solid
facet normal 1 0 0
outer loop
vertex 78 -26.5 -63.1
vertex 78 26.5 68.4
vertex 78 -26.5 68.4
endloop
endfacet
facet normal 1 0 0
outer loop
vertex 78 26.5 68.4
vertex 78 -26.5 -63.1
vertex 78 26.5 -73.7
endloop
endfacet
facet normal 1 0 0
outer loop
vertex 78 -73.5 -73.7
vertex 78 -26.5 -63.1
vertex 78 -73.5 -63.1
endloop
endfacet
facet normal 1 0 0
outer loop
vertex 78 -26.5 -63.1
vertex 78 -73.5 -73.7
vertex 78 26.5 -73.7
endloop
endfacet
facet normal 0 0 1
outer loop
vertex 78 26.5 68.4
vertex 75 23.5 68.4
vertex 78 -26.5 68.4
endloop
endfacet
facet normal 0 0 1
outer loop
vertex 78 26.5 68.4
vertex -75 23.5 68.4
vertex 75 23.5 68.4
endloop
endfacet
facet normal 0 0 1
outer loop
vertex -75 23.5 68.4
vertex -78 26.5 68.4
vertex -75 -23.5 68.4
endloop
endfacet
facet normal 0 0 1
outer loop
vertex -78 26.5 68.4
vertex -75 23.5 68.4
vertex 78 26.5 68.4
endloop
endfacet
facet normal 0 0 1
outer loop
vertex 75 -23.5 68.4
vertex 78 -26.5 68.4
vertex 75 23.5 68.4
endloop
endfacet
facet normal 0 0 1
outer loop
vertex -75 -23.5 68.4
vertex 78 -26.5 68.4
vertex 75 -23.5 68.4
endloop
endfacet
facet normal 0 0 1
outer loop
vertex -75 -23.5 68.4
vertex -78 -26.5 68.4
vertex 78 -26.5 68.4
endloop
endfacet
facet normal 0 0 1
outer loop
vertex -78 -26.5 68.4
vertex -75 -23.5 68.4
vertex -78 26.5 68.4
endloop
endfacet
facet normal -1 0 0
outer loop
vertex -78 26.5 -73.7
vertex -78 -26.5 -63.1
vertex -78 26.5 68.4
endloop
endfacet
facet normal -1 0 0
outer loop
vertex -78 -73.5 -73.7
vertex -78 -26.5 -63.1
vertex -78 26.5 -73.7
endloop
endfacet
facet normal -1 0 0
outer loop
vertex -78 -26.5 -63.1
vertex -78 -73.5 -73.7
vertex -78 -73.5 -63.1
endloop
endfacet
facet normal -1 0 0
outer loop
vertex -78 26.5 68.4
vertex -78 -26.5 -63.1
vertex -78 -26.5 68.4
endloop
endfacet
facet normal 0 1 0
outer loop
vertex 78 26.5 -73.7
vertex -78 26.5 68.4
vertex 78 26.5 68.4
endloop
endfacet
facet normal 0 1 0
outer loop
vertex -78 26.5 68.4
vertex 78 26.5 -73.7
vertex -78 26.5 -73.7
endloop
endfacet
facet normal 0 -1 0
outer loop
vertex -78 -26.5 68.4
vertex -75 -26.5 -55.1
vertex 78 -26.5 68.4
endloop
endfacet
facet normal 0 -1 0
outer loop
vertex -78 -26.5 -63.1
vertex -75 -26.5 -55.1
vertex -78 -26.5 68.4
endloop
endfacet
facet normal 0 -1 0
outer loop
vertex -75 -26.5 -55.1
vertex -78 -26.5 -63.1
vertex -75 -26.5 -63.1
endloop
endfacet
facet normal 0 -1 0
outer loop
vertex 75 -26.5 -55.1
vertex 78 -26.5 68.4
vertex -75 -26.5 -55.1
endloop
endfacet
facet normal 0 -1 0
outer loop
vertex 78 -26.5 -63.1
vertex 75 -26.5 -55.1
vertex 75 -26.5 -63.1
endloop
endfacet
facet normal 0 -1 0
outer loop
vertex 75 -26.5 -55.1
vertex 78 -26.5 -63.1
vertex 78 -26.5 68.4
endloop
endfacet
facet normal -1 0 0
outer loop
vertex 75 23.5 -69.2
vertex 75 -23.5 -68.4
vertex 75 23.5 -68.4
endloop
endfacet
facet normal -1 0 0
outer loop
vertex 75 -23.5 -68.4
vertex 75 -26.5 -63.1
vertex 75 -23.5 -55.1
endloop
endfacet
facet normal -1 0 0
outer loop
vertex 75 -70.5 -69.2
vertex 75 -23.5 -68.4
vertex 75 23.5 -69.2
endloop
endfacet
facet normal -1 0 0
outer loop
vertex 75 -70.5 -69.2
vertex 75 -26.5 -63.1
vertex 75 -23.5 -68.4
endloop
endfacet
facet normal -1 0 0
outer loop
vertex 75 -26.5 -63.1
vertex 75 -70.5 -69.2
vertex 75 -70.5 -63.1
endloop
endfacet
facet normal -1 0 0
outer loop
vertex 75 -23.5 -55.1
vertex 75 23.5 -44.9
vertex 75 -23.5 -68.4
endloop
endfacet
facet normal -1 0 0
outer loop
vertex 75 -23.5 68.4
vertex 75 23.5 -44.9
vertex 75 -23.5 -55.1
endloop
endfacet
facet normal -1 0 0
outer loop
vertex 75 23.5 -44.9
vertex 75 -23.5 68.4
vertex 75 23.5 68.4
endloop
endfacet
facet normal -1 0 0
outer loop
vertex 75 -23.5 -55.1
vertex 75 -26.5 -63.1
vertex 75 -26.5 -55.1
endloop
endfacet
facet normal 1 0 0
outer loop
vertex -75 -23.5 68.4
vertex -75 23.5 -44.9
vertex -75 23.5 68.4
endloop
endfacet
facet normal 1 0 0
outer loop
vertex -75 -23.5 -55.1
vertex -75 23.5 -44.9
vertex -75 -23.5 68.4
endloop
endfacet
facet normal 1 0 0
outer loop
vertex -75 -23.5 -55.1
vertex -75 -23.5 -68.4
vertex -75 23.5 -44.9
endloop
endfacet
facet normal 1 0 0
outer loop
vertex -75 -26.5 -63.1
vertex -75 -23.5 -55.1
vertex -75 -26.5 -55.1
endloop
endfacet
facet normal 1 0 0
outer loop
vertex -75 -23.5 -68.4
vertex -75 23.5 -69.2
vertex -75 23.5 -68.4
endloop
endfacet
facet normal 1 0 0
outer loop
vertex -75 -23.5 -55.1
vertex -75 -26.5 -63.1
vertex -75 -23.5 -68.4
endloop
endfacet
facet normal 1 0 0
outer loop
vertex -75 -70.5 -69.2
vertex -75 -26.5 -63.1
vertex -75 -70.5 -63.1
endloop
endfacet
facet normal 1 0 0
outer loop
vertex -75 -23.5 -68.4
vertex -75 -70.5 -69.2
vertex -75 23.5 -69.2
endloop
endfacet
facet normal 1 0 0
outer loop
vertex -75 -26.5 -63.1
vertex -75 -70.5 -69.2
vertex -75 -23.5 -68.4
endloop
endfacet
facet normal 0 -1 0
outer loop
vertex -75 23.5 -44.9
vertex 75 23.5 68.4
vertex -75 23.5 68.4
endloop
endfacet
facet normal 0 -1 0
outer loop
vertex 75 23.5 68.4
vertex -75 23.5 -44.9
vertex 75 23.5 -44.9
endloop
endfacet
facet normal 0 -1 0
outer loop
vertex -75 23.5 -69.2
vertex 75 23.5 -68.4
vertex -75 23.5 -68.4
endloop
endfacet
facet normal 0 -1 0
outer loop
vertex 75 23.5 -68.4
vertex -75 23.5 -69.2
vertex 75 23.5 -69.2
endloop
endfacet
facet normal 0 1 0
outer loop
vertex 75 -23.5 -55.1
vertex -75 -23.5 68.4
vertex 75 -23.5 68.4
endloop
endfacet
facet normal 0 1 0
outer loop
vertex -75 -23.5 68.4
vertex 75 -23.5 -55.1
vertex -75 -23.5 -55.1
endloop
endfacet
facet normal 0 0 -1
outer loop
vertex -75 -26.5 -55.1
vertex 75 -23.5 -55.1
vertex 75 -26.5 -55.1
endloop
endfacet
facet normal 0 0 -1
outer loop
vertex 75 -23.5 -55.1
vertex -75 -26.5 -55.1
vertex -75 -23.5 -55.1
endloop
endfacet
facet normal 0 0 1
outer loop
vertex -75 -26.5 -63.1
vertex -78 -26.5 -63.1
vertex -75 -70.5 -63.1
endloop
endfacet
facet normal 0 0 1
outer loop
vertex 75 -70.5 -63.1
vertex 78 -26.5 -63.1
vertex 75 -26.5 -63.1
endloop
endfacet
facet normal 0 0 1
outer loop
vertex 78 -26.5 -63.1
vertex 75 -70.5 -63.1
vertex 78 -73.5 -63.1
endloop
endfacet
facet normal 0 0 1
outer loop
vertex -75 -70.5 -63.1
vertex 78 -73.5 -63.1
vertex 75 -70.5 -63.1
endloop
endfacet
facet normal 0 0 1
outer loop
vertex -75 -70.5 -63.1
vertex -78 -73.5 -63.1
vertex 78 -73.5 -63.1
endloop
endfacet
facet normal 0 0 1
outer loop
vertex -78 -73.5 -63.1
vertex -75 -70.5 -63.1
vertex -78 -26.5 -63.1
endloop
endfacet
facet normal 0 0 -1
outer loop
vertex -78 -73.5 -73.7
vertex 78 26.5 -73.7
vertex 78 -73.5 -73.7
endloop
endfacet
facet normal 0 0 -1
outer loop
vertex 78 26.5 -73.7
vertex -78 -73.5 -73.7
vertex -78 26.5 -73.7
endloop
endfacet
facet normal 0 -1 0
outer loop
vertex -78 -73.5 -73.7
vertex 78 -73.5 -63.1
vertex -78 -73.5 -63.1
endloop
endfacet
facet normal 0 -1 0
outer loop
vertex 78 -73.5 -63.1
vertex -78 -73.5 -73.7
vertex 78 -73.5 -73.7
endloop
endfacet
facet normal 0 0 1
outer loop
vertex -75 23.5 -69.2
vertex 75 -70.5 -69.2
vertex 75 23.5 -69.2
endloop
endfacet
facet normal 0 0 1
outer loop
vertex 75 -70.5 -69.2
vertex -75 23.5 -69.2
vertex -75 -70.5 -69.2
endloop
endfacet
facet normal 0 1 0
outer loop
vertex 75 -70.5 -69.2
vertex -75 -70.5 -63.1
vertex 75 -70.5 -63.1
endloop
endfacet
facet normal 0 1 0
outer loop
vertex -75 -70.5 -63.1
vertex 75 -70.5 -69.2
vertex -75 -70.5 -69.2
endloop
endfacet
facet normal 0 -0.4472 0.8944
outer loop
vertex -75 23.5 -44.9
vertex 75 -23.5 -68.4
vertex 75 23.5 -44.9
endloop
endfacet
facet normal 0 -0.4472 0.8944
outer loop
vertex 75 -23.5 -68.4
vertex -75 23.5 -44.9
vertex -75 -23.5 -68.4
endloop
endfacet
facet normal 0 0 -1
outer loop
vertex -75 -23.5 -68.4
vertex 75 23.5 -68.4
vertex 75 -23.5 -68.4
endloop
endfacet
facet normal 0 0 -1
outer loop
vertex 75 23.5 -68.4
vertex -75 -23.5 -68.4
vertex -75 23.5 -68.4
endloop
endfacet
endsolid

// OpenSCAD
// Contacts dispenser

// An individual contact package
pkg_width  = 30;
pkg_depth  = 47;
pkg_height = 7.6;

// Interior volume
n_per_row  = 5;
n_rows     = 90 / 5;
x = pkg_width * n_per_row;
y = pkg_depth;
z = pkg_height * n_rows;

// Preferences
wall_thickness = 3;

module contacts() {
  color("blue") cube([x, y, z], center=true);
}

module tray() {
  t = wall_thickness;
  // base
  difference() {
    translate([0, -y/2, -z/2])
      color("red")
      cube([x + 2*t, 2*y + 2*t, pkg_height + t], center=true);
    translate([0, -y/2, -z/2 + t])
      color("pink")
      cube([x, 2*y, pkg_height], center=true);
  }
  // ramp
  translate([-x/2, y/2, -z/2])
    rotate([-90, -90, -90])
    color("green")
    linear_extrude(x)
    polygon([[0, 0], [y/2, 0], [0, y]]);
}

module chamber() {
  t = wall_thickness;
  difference() {
    cube([x + 2*t, y + 2*t, z], center=true);
    contacts();
    // exit door
    dt = 1.75 * pkg_height;
    translate([0, -y/2, -z/2+dt/2])
      color("green")
      cube([x, y, dt], center=true);
  }
}

module dispenser() {
  chamber();
  tray();
}

dispenser();
